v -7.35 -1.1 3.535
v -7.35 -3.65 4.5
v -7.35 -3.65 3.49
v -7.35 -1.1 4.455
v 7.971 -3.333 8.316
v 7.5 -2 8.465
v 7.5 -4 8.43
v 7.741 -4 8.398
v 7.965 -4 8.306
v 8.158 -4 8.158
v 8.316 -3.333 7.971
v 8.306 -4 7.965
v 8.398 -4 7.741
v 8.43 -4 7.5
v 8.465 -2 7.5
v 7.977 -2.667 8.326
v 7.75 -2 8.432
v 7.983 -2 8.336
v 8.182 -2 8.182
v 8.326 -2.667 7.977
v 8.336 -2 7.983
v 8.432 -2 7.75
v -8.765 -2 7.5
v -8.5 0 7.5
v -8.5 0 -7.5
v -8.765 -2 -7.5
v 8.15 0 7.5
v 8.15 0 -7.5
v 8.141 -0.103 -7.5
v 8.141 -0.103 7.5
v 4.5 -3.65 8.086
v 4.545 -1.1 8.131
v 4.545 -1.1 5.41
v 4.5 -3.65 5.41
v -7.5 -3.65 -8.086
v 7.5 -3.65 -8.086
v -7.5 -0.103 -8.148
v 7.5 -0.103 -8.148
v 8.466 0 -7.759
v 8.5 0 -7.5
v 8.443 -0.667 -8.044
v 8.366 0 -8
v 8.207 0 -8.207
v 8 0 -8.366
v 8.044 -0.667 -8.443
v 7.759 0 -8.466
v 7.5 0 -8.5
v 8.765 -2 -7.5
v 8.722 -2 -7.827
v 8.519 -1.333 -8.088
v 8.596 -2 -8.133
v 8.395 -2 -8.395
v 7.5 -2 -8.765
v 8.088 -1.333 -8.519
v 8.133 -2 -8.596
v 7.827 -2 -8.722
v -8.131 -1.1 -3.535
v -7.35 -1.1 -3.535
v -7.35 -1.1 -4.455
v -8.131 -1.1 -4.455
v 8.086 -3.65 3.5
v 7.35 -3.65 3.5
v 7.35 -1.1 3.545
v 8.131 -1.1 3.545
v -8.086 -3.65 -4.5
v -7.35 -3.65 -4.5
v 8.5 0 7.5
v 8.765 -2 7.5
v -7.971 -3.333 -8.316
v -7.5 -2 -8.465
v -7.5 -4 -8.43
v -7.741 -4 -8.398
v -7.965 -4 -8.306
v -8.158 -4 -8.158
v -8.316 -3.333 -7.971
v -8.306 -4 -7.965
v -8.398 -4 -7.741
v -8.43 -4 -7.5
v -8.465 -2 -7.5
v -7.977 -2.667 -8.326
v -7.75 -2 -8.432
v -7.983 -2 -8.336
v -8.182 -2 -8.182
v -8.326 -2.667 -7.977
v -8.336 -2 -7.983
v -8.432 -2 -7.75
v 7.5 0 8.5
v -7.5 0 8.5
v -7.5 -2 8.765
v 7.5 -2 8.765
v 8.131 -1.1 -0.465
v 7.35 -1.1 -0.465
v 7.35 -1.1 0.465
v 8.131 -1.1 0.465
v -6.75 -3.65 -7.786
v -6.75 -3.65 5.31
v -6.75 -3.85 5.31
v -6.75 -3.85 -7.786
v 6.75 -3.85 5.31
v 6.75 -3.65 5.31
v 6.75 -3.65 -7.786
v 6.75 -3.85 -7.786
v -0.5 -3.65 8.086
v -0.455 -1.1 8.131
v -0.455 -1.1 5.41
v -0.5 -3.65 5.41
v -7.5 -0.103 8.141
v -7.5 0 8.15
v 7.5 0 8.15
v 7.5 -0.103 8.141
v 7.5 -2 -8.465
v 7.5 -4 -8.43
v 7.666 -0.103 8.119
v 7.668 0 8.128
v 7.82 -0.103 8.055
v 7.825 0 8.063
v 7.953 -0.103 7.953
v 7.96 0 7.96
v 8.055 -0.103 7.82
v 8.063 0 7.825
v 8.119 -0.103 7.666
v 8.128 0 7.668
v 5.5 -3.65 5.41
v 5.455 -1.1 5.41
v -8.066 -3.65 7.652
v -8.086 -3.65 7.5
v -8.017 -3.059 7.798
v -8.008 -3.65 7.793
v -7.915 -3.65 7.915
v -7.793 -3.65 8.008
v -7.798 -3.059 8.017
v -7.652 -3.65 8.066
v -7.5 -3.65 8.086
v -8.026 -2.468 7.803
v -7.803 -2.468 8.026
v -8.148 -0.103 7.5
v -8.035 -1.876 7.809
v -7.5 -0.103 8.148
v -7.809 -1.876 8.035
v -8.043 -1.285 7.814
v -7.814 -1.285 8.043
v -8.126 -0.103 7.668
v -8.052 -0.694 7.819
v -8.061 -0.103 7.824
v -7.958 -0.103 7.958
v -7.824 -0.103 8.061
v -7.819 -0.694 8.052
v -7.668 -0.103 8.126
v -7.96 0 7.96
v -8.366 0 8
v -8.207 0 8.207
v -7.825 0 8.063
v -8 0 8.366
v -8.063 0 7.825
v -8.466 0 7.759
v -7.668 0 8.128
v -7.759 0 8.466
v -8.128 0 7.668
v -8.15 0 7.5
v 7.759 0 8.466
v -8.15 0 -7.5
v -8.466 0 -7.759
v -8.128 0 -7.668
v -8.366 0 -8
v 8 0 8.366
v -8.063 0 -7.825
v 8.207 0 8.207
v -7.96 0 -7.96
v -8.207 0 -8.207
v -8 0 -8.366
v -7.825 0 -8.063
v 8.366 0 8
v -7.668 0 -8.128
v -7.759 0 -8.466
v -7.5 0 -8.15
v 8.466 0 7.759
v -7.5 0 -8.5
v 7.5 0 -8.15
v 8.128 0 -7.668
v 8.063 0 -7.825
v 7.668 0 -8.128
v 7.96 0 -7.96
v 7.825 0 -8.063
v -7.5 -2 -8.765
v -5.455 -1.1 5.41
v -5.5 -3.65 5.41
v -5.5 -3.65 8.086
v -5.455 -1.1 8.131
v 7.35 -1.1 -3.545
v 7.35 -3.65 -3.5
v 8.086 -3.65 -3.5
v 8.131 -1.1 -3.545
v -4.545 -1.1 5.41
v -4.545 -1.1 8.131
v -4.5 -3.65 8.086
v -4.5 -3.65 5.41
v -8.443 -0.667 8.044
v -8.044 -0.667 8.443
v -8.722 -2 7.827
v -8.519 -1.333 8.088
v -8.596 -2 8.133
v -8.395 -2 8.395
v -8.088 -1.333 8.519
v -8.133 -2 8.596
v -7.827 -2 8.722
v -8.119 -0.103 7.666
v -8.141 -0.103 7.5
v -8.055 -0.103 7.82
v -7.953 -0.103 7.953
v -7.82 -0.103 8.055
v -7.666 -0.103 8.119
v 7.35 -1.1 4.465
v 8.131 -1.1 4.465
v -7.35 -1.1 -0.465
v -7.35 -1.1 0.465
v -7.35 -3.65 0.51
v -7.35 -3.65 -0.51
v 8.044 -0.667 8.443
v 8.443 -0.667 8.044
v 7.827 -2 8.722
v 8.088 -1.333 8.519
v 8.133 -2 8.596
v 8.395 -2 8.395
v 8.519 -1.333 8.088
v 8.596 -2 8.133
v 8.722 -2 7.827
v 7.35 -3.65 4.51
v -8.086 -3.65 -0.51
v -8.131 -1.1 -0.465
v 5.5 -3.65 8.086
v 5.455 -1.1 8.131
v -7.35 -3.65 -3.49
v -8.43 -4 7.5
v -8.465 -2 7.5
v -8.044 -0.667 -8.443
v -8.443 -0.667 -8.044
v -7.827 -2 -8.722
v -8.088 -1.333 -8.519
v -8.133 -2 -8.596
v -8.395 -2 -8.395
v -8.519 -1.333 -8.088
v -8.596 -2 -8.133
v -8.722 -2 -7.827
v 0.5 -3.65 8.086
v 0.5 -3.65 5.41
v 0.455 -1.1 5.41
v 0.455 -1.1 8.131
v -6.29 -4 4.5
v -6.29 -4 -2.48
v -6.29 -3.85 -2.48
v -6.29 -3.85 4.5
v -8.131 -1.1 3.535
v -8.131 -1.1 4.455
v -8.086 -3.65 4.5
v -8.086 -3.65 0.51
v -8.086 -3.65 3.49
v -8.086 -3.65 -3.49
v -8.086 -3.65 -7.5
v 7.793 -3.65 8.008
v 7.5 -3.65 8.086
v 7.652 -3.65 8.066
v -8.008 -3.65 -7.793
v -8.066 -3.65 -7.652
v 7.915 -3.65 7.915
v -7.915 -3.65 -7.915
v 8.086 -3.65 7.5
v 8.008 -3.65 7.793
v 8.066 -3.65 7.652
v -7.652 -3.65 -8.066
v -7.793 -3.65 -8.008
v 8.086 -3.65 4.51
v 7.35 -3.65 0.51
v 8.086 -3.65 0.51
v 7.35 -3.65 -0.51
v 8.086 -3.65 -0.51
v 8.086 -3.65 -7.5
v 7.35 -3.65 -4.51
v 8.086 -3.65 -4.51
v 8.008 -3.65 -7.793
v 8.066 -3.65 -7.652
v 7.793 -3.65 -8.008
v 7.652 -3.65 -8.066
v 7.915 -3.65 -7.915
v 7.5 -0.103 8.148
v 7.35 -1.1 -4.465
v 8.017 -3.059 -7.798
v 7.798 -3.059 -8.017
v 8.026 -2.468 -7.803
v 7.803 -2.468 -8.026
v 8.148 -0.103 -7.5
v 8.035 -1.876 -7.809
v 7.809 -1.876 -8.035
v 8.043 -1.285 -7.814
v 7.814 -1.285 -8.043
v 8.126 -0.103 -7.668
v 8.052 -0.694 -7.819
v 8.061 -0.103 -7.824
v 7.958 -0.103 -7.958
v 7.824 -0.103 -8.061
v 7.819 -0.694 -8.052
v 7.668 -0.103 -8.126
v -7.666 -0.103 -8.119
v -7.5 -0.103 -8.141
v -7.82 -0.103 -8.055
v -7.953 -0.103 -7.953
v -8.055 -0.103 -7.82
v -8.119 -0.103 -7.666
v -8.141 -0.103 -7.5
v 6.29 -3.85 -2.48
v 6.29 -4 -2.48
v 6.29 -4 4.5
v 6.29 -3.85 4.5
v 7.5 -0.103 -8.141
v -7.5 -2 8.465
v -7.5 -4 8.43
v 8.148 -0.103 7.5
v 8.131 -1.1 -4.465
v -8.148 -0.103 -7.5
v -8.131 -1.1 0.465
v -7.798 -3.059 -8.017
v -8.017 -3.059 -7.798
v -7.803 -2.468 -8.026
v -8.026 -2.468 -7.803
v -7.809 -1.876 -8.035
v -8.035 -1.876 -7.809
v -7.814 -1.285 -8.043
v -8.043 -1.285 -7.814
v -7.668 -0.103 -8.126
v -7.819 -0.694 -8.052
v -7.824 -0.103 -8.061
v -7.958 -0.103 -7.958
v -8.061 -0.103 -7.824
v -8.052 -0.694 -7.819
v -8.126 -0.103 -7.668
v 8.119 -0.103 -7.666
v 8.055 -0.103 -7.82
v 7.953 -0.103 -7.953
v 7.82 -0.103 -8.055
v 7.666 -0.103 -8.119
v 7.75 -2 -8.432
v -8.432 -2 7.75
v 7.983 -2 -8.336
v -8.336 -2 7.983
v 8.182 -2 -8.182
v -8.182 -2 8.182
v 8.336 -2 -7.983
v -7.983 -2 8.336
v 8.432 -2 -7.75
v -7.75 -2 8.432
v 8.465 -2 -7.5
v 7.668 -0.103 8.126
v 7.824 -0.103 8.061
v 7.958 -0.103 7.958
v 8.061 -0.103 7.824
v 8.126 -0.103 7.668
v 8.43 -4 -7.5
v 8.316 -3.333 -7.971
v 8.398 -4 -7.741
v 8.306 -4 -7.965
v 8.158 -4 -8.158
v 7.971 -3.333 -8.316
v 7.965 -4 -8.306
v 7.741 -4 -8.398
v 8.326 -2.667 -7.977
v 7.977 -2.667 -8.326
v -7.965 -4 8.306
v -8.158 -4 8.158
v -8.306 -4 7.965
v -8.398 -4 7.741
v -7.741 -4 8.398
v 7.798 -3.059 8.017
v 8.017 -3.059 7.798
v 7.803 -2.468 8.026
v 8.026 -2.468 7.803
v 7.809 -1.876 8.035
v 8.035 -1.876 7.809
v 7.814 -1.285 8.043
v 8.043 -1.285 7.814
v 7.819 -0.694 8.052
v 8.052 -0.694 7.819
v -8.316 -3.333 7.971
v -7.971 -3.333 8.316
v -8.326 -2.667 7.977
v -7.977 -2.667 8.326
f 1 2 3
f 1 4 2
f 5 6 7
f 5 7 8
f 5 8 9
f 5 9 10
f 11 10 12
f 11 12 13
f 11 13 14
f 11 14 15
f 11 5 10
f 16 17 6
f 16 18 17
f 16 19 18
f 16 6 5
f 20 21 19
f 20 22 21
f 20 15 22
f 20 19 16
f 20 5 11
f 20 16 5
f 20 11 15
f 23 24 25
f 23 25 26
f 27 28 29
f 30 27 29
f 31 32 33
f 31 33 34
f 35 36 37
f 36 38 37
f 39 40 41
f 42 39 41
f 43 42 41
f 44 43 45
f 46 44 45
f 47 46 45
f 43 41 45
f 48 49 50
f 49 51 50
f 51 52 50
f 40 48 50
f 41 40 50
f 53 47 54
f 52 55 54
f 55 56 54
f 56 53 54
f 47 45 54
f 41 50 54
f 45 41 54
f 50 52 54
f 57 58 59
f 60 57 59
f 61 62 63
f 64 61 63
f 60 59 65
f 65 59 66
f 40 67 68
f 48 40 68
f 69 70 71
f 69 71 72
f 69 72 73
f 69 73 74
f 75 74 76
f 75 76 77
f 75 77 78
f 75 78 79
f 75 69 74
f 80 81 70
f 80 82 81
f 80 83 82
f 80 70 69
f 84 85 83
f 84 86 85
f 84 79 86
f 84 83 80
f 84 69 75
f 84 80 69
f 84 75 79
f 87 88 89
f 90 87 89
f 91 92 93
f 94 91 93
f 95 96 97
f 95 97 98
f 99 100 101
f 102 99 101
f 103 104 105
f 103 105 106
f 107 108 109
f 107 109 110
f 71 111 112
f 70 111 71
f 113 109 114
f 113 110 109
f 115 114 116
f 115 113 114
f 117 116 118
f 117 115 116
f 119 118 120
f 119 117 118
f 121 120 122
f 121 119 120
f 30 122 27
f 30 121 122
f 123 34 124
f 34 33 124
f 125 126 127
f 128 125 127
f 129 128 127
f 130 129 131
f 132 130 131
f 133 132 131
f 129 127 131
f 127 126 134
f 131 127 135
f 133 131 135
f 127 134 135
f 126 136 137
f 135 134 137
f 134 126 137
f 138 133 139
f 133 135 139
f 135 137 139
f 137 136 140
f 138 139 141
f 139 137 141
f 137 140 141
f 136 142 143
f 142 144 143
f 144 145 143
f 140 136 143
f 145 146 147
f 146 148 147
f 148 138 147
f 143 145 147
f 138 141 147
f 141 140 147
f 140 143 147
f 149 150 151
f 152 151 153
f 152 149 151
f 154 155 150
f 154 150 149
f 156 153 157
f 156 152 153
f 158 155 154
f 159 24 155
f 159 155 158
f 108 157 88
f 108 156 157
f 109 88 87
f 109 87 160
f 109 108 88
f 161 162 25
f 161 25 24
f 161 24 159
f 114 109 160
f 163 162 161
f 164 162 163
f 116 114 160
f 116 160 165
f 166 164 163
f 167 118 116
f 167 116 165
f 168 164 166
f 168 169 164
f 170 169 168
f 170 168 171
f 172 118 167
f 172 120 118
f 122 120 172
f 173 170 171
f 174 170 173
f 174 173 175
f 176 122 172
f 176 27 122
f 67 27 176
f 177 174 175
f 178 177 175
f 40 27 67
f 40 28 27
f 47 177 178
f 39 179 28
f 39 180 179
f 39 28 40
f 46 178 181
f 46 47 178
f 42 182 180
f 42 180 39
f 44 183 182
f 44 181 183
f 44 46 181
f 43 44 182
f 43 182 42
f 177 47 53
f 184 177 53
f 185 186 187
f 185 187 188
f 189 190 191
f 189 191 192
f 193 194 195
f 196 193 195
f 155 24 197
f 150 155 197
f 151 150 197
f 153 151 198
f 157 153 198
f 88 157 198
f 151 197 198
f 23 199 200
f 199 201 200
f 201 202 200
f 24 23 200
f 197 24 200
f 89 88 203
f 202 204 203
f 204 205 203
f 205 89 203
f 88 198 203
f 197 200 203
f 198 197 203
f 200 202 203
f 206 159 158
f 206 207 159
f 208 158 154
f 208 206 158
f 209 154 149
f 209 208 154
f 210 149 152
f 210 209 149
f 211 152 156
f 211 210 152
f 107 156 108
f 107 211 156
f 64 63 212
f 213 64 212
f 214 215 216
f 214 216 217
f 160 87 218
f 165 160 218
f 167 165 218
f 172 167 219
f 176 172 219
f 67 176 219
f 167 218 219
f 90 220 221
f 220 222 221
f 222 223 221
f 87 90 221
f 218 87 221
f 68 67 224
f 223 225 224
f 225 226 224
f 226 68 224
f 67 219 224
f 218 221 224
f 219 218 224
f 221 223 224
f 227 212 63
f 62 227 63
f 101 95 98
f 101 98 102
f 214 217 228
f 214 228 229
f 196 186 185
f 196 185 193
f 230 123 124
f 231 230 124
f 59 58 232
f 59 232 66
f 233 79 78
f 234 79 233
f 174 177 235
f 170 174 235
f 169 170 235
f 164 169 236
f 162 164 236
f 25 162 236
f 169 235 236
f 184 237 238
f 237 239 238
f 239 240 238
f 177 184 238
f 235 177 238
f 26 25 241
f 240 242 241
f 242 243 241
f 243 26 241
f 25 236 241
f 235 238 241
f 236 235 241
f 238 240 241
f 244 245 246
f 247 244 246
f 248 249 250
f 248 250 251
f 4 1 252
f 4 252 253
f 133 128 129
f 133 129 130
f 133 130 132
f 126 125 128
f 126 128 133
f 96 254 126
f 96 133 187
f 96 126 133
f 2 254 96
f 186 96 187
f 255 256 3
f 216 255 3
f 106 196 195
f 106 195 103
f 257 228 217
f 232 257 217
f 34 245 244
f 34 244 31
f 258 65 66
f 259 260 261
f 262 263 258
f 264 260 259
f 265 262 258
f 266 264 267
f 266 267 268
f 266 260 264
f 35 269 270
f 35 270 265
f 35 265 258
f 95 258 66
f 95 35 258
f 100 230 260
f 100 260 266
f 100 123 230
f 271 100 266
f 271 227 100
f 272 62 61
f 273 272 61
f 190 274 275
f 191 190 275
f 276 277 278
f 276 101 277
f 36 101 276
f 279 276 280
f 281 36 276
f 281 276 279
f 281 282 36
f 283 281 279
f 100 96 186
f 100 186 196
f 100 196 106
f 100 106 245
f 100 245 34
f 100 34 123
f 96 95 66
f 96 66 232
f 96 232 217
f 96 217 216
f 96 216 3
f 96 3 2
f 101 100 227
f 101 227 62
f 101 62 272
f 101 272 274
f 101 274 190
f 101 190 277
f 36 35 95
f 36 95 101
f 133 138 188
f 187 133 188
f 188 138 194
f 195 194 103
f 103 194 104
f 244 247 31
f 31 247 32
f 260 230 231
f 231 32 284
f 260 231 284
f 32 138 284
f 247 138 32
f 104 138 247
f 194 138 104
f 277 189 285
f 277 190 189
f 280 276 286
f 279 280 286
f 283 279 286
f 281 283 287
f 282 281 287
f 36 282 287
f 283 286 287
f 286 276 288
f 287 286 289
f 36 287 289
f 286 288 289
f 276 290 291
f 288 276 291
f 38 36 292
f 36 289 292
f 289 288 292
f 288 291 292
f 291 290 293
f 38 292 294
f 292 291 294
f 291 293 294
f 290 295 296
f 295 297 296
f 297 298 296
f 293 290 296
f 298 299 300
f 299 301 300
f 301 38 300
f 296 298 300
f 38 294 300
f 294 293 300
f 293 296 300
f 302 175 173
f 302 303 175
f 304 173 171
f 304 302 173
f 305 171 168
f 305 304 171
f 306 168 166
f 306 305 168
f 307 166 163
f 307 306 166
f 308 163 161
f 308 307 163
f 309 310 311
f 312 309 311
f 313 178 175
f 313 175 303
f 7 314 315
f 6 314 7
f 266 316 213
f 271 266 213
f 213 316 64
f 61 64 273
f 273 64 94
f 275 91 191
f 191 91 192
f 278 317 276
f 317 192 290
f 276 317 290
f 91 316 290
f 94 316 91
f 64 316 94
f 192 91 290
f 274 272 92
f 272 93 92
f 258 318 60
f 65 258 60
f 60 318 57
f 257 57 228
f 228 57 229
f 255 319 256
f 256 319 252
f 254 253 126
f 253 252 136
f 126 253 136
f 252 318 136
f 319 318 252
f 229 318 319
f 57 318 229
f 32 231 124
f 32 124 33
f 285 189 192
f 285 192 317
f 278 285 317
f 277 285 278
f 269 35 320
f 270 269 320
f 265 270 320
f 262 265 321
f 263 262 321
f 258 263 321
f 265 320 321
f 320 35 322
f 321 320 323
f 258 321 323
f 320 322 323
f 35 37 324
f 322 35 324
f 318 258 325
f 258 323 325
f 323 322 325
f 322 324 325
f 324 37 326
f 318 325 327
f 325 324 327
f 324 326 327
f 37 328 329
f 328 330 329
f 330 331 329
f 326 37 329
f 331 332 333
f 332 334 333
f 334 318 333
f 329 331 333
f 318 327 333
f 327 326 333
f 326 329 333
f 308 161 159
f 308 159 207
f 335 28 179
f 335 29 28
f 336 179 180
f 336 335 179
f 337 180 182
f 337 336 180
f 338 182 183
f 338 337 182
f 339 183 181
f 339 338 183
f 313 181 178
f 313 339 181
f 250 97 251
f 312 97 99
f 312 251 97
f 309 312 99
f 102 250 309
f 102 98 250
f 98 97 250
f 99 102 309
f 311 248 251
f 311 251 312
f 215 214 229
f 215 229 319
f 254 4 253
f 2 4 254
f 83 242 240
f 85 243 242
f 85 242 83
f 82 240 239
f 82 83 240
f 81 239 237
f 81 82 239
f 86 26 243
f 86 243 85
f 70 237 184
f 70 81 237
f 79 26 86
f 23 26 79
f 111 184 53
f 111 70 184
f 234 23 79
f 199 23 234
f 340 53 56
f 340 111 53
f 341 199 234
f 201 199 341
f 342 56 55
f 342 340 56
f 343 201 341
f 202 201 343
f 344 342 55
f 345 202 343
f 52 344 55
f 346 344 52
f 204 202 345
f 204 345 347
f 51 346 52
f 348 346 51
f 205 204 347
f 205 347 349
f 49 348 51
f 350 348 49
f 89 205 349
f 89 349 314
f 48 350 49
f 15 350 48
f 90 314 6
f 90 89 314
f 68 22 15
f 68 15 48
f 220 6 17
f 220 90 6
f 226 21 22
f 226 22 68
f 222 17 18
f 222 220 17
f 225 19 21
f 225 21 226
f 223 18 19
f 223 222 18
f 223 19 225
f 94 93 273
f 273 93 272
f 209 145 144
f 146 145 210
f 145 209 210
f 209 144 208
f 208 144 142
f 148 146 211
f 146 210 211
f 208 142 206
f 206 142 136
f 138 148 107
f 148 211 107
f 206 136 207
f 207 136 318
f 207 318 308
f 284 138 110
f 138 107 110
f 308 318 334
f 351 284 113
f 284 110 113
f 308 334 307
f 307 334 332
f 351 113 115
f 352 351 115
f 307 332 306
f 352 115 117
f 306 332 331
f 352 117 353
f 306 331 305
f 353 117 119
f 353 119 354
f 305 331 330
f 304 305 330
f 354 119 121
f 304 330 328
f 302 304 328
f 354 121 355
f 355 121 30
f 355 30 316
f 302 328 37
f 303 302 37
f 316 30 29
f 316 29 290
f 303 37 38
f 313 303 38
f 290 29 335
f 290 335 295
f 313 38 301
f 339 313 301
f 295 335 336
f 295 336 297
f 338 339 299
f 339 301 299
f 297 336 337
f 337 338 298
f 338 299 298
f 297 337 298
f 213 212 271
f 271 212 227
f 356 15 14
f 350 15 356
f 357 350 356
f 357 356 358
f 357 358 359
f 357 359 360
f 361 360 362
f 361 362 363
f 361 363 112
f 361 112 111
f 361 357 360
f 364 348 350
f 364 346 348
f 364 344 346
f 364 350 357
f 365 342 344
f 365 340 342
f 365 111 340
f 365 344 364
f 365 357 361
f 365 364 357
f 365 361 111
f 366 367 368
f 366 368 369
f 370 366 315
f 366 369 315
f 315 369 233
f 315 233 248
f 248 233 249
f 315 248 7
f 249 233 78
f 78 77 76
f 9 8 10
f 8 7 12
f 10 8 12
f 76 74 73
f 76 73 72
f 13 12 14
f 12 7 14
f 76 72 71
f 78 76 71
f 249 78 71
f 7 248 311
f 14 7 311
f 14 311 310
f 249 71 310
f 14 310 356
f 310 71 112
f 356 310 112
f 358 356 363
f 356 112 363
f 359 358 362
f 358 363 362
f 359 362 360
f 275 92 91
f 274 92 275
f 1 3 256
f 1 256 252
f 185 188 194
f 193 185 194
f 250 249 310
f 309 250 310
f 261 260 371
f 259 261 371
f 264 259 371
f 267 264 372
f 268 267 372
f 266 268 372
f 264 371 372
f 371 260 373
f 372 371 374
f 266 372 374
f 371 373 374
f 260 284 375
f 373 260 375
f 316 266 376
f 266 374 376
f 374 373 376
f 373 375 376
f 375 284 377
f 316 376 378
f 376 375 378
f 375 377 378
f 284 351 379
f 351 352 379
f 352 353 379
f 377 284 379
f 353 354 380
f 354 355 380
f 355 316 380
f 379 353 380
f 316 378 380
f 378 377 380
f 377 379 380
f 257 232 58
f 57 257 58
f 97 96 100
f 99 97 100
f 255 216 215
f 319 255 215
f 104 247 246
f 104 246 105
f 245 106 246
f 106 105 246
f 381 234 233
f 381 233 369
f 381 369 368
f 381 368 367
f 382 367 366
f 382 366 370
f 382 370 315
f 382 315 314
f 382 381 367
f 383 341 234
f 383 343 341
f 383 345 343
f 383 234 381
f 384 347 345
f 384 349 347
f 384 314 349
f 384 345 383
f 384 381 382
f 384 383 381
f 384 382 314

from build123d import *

# Parameters (mm, degrees)
BOSS_EXTRUDE1_DEPTH  = 4
BOSS_EXTRUDE1_DRAFT  = -1
SHELL1_T             = -0.35
SKETCH2_W            = 12.58
SKETCH2_H            = 6.98
CUT_EXTRUDE1_DEPTH   = 2
SKETCH3_W            = 13.5
SKETCH3_H            = 13.096235698
CUT_EXTRUDE2_DEPTH   = 0.2
BOSS_EXTRUDE3_REACH  = 20.425
BOSS_EXTRUDE4_REACH  = 20.425
LPATTERN2_COUNT      = 2
LPATTERN2_PITCH      = 4
MIRROR4_COPY_1_REACH = 20.425
LPATTERN3_COUNT      = 2
LPATTERN3_PITCH      = 4
MIRROR5_COPY_1_REACH = 20.425
BOSS_EXTRUDE5_REACH  = 18.785
LPATTERN4_COUNT      = 2
LPATTERN4_PITCH      = 5
MIRROR6_COPY_1_REACH = 18.785
MIRROR6_COPY_2_REACH = 18.785


with BuildPart() as part:
    # Sketch1 → Boss-Extrude1 (with draft: the straight prism first)
    with BuildSketch(Plane(origin=(0, 0, 0), x_dir=(1, 0, 0), z_dir=(0, 1, 0))):
        with BuildLine():
            Line((-7.5, -8.5), (7.5, -8.5))
            ThreePointArc((7.5, -8.5), (8.207106781, -8.207106781), (8.5, -7.5))
            Line((8.5, -7.5), (8.5, 7.5))
            ThreePointArc((8.5, 7.5), (8.207106781, 8.207106781), (7.5, 8.5))
            Line((7.5, 8.5), (-7.5, 8.5))
            ThreePointArc((-7.5, 8.5), (-8.207106781, 8.207106781), (-8.5, 7.5))
            Line((-8.5, 7.5), (-8.5, -7.5))
            ThreePointArc((-8.5, -7.5), (-8.207106781, -8.207106781), (-7.5, -8.5))
        make_face()
    extrude(amount=-BOSS_EXTRUDE1_DEPTH)
    # Boss-Extrude1: the draft: its side faces are tilted about the plane it starts from
    boss_extrude1_sides = [part.faces().sort_by_distance(p)[0] for p in [
        (0, -2, 8.5),
        (8.207106781, -2, 8.207106781),
        (8.5, -2, 0),
        (8.207106781, -2, -8.207106781),
        (0, -2, -8.5),
        (-8.207106781, -2, -8.207106781),
        (-8.5, -2, 0),
        (-8.207106781, -2, 8.207106781),
    ]]
    draft(boss_extrude1_sides, Plane(origin=(0, 0, 0), x_dir=(1, 0, 0), z_dir=(0, 1, 0)), BOSS_EXTRUDE1_DRAFT)

    # Shell1
    shell1_openings = [part.faces().sort_by_distance(p)[0] for p in [
        (0, 0, 0),
    ]]
    offset(amount=SHELL1_T, openings=shell1_openings, kind=Kind.INTERSECTION)

    # Sketch2 → Cut-Extrude1 (cut)
    with BuildSketch(Plane.XZ.offset(4)):
        with Locations((0, 1.01)):
            Rectangle(SKETCH2_W, SKETCH2_H)
    extrude(amount=-CUT_EXTRUDE1_DEPTH, mode=Mode.SUBTRACT)

    # Sketch3 → Cut-Extrude2 (cut)
    with BuildSketch(Plane(origin=(0, -3.65, 0), x_dir=(1, 0, 0), z_dir=(0, 1, 0))):
        with Locations((0, 1.238117849)):
            Rectangle(SKETCH3_W, SKETCH3_H)
    extrude(amount=-CUT_EXTRUDE2_DEPTH, mode=Mode.SUBTRACT)

    # Boss-Extrude3: up to this plane
    boss_extrude3_end = Plane(origin=(8.150053307, 0.006108342, 7.5), z_dir=(0.9998476951563913, -0.01745240643728355, 0))
    # Sketch11 → Boss-Extrude3 (add, up to the surface)
    with BuildSketch(Plane.ZY.offset(-7.35), mode=Mode.PRIVATE) as boss_extrude3_sk1:
        Polygon((-0.455489584, -1.1), (0.46508987, -1.1), (0.509600286, -3.65), (-0.5, -3.65), align=None)
    boss_extrude3_tool1 = split(extrude(boss_extrude3_sk1.sketch, amount=-BOSS_EXTRUDE3_REACH, mode=Mode.PRIVATE), bisect_by=boss_extrude3_end, keep=Keep.BOTH, mode=Mode.PRIVATE)
    boss_extrude3 = boss_extrude3_tool1.solids().sort_by_distance((7.35, -2.394601, 0.0048))[0]
    add(boss_extrude3)

    # Boss-Extrude4: up to this plane
    boss_extrude4_end = Plane(origin=(-8.150053307, 0.006108342, 7.5), z_dir=(-0.9998476951563913, -0.01745240643728355, 0))
    # Sketch13 → Boss-Extrude4 (add, up to the surface)
    with BuildSketch(Plane(origin=(-7.35, 0, 0), x_dir=(0, 0, -1), z_dir=(1, 0, 0)), mode=Mode.PRIVATE) as boss_extrude4_sk1:
        Polygon((-0.5, -3.65), (0.509600286, -3.65), (0.46508987, -1.1), (-0.455489584, -1.1), align=None)
    boss_extrude4_tool1 = split(extrude(boss_extrude4_sk1.sketch, amount=-BOSS_EXTRUDE4_REACH, mode=Mode.PRIVATE), bisect_by=boss_extrude4_end, keep=Keep.BOTH, mode=Mode.PRIVATE)
    boss_extrude4 = boss_extrude4_tool1.solids().sort_by_distance((-7.35, -2.394601, -0.0048))[0]
    add(boss_extrude4)

    # LPattern2: Boss-Extrude3 ×2
    with Locations(*[(0, 0, i * LPATTERN2_PITCH) for i in range(1, LPATTERN2_COUNT)]):
        add(boss_extrude3)

    # Mirror4: Boss-Extrude3 across plane
    add(boss_extrude3.mirror(Plane.XY))

    # Mirror4 copy 1: up to this plane
    mirror4_copy_1_end = Plane(origin=(8.150053307, 0.006108342, 7.5), z_dir=(0.9998476951563913, -0.01745240643728355, 0))
    # Mirror4 copy 1 sketch → Mirror4 copy 1 (add, up to the surface)
    with BuildSketch(Plane(origin=(7.35, 0, -4), x_dir=(0, 0, -1), z_dir=(-1, 0, 0)), mode=Mode.PRIVATE) as mirror4_copy_1_sk1:
        Polygon((-0.455489584, 1.1), (0.46508987, 1.1), (0.509600286, 3.65), (-0.5, 3.65), align=None)
    mirror4_copy_1_tool1 = split(extrude(mirror4_copy_1_sk1.sketch, amount=-MIRROR4_COPY_1_REACH, mode=Mode.PRIVATE), bisect_by=mirror4_copy_1_end, keep=Keep.BOTH, mode=Mode.PRIVATE)
    add(mirror4_copy_1_tool1.solids().sort_by_distance((7.35, -2.394601, 0.0048))[0])

    # LPattern3: Boss-Extrude4 ×2
    with Locations(*[(0, 0, i * LPATTERN3_PITCH) for i in range(1, LPATTERN3_COUNT)]):
        add(boss_extrude4)

    # Mirror5: Boss-Extrude4 across plane
    add(boss_extrude4.mirror(Plane.XY))

    # Mirror5 copy 1: up to this plane
    mirror5_copy_1_end = Plane(origin=(-8.150053307, 0.006108342, 7.5), z_dir=(-0.9998476951563913, -0.01745240643728355, 0))
    # Mirror5 copy 1 sketch → Mirror5 copy 1 (add, up to the surface)
    with BuildSketch(Plane(origin=(-7.35, 0, -4), x_dir=(0, 0, 1), z_dir=(1, 0, 0)), mode=Mode.PRIVATE) as mirror5_copy_1_sk1:
        Polygon((-0.5, 3.65), (0.509600286, 3.65), (0.46508987, 1.1), (-0.455489584, 1.1), align=None)
    mirror5_copy_1_tool1 = split(extrude(mirror5_copy_1_sk1.sketch, amount=-MIRROR5_COPY_1_REACH, mode=Mode.PRIVATE), bisect_by=mirror5_copy_1_end, keep=Keep.BOTH, mode=Mode.PRIVATE)
    add(mirror5_copy_1_tool1.solids().sort_by_distance((-7.35, -2.394601, -0.0048))[0])

    # Boss-Extrude5: up to this plane
    boss_extrude5_end = Plane(origin=(-7.5, 0.006108342, 8.150053307), z_dir=(0, -0.017452406437283553, 0.9998476951563913))
    # Sketch16 → Boss-Extrude5 (add, up to the surface)
    with BuildSketch(Plane.XY.offset(5.41), mode=Mode.PRIVATE) as boss_extrude5_sk1:
        Polygon((-0.5, -3.65), (0.5, -3.65), (0.455489584, -1.1), (-0.455489584, -1.1), align=None)
    boss_extrude5_tool1 = split(extrude(boss_extrude5_sk1.sketch, amount=BOSS_EXTRUDE5_REACH, mode=Mode.PRIVATE), bisect_by=boss_extrude5_end, keep=Keep.BOTH, mode=Mode.PRIVATE)
    boss_extrude5 = boss_extrude5_tool1.solids().sort_by_distance((0, -2.394798, 5.41))[0]
    add(boss_extrude5)

    # LPattern4: Boss-Extrude5 ×2
    with Locations(*[(i * LPATTERN4_PITCH, 0, 0) for i in range(1, LPATTERN4_COUNT)]):
        add(boss_extrude5)

    # Mirror6 copy 1: up to this plane
    mirror6_copy_1_end = Plane(origin=(-7.5, 0.006108342, 8.150053307), z_dir=(0, -0.017452406437283553, 0.9998476951563913))
    # Mirror6 copy 1 sketch → Mirror6 copy 1 (add, up to the surface)
    with BuildSketch(Plane(origin=(-5, 0, 5.41), x_dir=(-1, 0, 0), z_dir=(0, 0, 1)), mode=Mode.PRIVATE) as mirror6_copy_1_sk1:
        Polygon((-0.5, 3.65), (0.5, 3.65), (0.455489584, 1.1), (-0.455489584, 1.1), align=None)
    mirror6_copy_1_tool1 = split(extrude(mirror6_copy_1_sk1.sketch, amount=MIRROR6_COPY_1_REACH, mode=Mode.PRIVATE), bisect_by=mirror6_copy_1_end, keep=Keep.BOTH, mode=Mode.PRIVATE)
    add(mirror6_copy_1_tool1.solids().sort_by_distance((0, -2.394798, 5.41))[0])

    # Mirror6 copy 2: up to this plane
    mirror6_copy_2_end = Plane(origin=(-7.5, 0.006108342, 8.150053307), z_dir=(0, -0.017452406437283553, 0.9998476951563913))
    # Mirror6 copy 2 sketch → Mirror6 copy 2 (add, up to the surface)
    with BuildSketch(Plane(origin=(0, 0, 5.41), x_dir=(-1, 0, 0), z_dir=(0, 0, 1)), mode=Mode.PRIVATE) as mirror6_copy_2_sk1:
        Polygon((-0.5, 3.65), (0.5, 3.65), (0.455489584, 1.1), (-0.455489584, 1.1), align=None)
    mirror6_copy_2_tool1 = split(extrude(mirror6_copy_2_sk1.sketch, amount=MIRROR6_COPY_2_REACH, mode=Mode.PRIVATE), bisect_by=mirror6_copy_2_end, keep=Keep.BOTH, mode=Mode.PRIVATE)
    add(mirror6_copy_2_tool1.solids().sort_by_distance((0, -2.394798, 5.41))[0])

    # Sweep1: sweep along a path in Sketch18
    with BuildLine(Plane(origin=(0, -2, 0), x_dir=(-1, 0, 0), z_dir=(0, -1, 0))) as sweep1_path:
        Line((8.5, 7.5), (8.5, -7.5))
        ThreePointArc((8.5, -7.5), (8.207106781, -8.207106781), (7.5, -8.5))
        Line((7.5, -8.5), (-7.5, -8.5))
        ThreePointArc((-7.5, -8.5), (-8.207106781, -8.207106781), (-8.5, -7.5))
        Line((-8.5, -7.5), (-8.5, 7.5))
        ThreePointArc((-8.5, 7.5), (-8.207106781, 8.207106781), (-7.5, 8.5))
        Line((-7.5, 8.5), (7.5, 8.5))
        ThreePointArc((7.5, 8.5), (8.207106781, 8.207106781), (8.5, 7.5))
    # Sketch17 → Sweep1 (sweep)
    with BuildSketch(Plane.XY):
        Polygon((-8.5, 0), (-8.46508987, -2), (-8.76508987, -2), align=None)
    sweep(path=sweep1_path.line)

    # Sweep2: sweep along a path in Sketch23
    with BuildLine(Plane(origin=(0, 0, 0), x_dir=(1, 0, 0), z_dir=(0, 1, 0))) as sweep2_path:
        Line((8.149946685, -7.5), (8.149946685, 7.5))
        ThreePointArc((8.149946685, 7.5), (7.959581709, 7.959581709), (7.5, 8.149946685))
        Line((7.5, 8.149946685), (-7.5, 8.149946685))
        ThreePointArc((-7.5, 8.149946685), (-7.959581709, 7.959581709), (-8.149946685, 7.5))
        Line((-8.149946685, 7.5), (-8.149946685, -7.5))
        ThreePointArc((-8.149946685, -7.5), (-7.959581709, -7.959581709), (-7.5, -8.149946685))
        Line((-7.5, -8.149946685), (7.5, -8.149946685))
        ThreePointArc((7.5, -8.149946685), (7.959581709, -7.959581709), (8.149946685, -7.5))
    # Sketch19 → Sweep2 (sweep)
    with BuildSketch(Plane.XY):
        Polygon((8.149946685, 0), (8.148156734, -0.102546259), (8.14097505, -0.102546259), align=None)
    sweep(path=sweep2_path.line)


solid = part.part
